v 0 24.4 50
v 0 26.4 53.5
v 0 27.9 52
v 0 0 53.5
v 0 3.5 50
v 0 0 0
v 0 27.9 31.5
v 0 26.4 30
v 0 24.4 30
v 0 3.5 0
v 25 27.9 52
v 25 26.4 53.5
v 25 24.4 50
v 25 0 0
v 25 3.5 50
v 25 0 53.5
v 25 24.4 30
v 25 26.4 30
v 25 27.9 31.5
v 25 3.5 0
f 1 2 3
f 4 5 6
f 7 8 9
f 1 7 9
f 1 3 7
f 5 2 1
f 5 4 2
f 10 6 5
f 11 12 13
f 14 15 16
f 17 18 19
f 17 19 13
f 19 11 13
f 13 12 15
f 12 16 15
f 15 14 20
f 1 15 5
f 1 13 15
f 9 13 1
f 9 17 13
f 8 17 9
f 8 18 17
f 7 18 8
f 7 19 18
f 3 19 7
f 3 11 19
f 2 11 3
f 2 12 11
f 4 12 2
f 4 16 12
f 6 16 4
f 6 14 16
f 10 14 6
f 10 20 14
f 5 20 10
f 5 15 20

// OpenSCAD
// file: Parts/Screw.scad
// created by IndiePandaaaaa | Lukas

TOLERANCE = .1;
$fn = $preview ? 30 : 75;

// metric standards                          M1   M2   M3   M4   M5 M6 M7   M8   M9  M10
function screw_metric_corehole(standard) = [.75, 1.6, 2.5, 3.3, 4.2, 5, 6, 6.8, 7.8, 8.5][standard - 1];
function screw_metric_borehole(standard) = [0, 0, 3.4, 4.5, 5.5, 6.6, 0, 9, 0, 11][standard - 1];
function screw_metric_countersunk_height(standard) = [0, 0, 1.7, 2.3, 2.8, 3.3, 0, 4.4, 0, 5.5][standard - 1];
function screw_metric_countersunk_od(standard) = standard * 2;

module screw_metric_countersunk(standard, length, unthreaded_length = 0, borehole_length = 0, tolerance = .15) {
  if (screw_metric_corehole(standard=standard) == 0) echo("ERROR: screw_metric_corehole value has not been set yet.");
  if (screw_metric_borehole(standard=standard) == 0) echo("ERROR: screw_metric_borehole value has not been set yet.");
  if (screw_metric_countersunk_height(standard=standard) == 0) echo("ERROR: screw_metric_countersunk_height value has not been set yet.");

  union() {
    translate(v=[0, 0, -.1]) {
      cylinder(h=.2 + borehole_length, d=screw_metric_countersunk_od(standard) + tolerance, center=false);
      translate(v=[0, 0, -screw_metric_countersunk_height(standard)]) {
        cylinder(h=screw_metric_countersunk_height(standard) + .01, d2=screw_metric_countersunk_od(standard) + tolerance, d1=screw_metric_borehole(standard) + tolerance, center=false);
        translate(v=[0, 0, -.1]) cylinder(h=.1, d=screw_metric_borehole(standard) + tolerance, center=false);
      }
    }
    translate(v=[0, 0, -length]) cylinder(h=length, d=screw_metric_corehole(standard) + tolerance, center=false);

    // unthreaded part
    translate(v=[0, 0, -.1 - screw_metric_countersunk_height(standard) - unthreaded_length]) cylinder(h=unthreaded_length + .1, d=screw_metric_borehole(standard) + tolerance, center=false);
  }
}

// TODO: module metric cylindric head screws

// TODO: module metric rounded head screws

function screw_wood_corehole(diameter) = diameter * 0.75;
function screw_wood_borehole(diameter) = diameter * 1.25;
function screw_wood_countersunk_height(diameter) = diameter * 0.75;

module screw_wood_countersunk(diameter, length, unthreaded_length = 0, tolerance = .15) {
  if (screw_metric_corehole(standard=standard) == 0) echo("ERROR: screw_metric_corehole value has not been set yet.");
  if (screw_metric_borehole(standard=standard) == 0) echo("ERROR: screw_metric_borehole value has not been set yet.");
  if (screw_metric_countersunk_height(standard=standard) == 0) echo("ERROR: screw_metric_countersunk_height value has not been set yet.");

  // TODO: add module for wood screws 
  union(){}
}

// TODO: module wood cylindric head screws

// TODO: module wood rounded head screws

function cone_diameter(diameter) = diameter * 2;
function cone_diameter_cutout(diameter) = diameter * 2 + 0.5;
function cone_height(diameter) = diameter * 0.75;

module screw(diameter, length = 12, cutout_sample = false) {
  module base_model(diameter, length, cone_height, cone_diameter, offset = 0) {
    rotate_extrude(angle=360) {
      polygon(
        [
          [0, 0],
          [(diameter + offset) / 2, 0],
          [(diameter + offset) / 2, (length + offset) - (cone_height + offset)],
          [(cone_diameter + offset) / 2, length + offset],
          [0, length + offset],
        ]
      );
    }
  }

  if (length < diameter) {
    echo("Screw is too short");
    length = diameter + 5;
    echo("New length is: ", length);
  }

  if (!cutout_sample) {
    translate([0, 0, -length])
      difference() {
        base_model(diameter, length, cone_height(diameter), cone_diameter(diameter));

        // top cross part
        translate([0, 0, length - (cone_height(diameter) - diameter / 2) + .1])
          difference() {
            rotate([0, 0, 45])
              rotate_extrude(angle=360) {
                polygon(
                  [
                    [0, 0],
                    [diameter * 1.4 / 2, 0],
                    [cone_diameter(diameter) / 3, cone_height(diameter) - diameter / 2],
                    [0, cone_height(diameter) - diameter / 2],
                  ]
                );
              }
            for (i = [0:1:3]) {
              rotate([0, 0, 90 * i])
                translate([diameter / 3.18 / 2, diameter / 3.18 / 2, 0]) cube(cone_height(diameter));
            }
          }
      }
  } else {
    offset = 0;
    diameter = cone_diameter_cutout(diameter) / 2; // is duplicated by function, used to reduce error
    translate([0, 0, -length - offset / 2]) {
      base_model(diameter, length, cone_height(diameter), cone_diameter(diameter), offset);
      translate([0, 0, length - .005]) cylinder(r=diameter, h=50);
    }
  }
}

module screw_corehole(diameter_screw, diameter_core, unthreaded_length, length = 12) {
  union() {
    screw(diameter=diameter_screw, length=unthreaded_length, cutout_sample=true);
    if (unthreaded_length < diameter_core - .1) {
      translate(v=[0, 0, -diameter_screw * .8]) cylinder(h=diameter_screw, d=diameter_screw + .3, center=false);
    }
    translate([0, 0, -length]) cylinder(d=diameter_core, h=length - unthreaded_length + .1);
  }
}

module screw_with_nut_metric(screw_length, diameter, square_channel = false, tolerance = .1) {
  function od(width) = ( (width / 2) / cos(30)) * 2; // calculates nut diameter from given width
  nut_thickness = [0.8, 1.6, 2.4, 3.2, 4, 5, 5.5, 6.5];
  nut_width = [2.5, 4, 5.5, 7.1, 8.1, 10.1, 11.1, 13.1];

  if (!(0 < diameter && diameter <= 8 && diameter == round(diameter))) {
    echo("module is only defined for integer values from M1 to M8.");
  } else {
    union() {
      if (!square_channel) {
        screw(diameter=diameter, length=screw_length, cutout_sample=true);

        translate([0, 0, -(screw_length * 2 - nut_thickness[diameter - 1])])
          cylinder(d=od(nut_width[diameter - 1]) + tolerance, h=screw_length, $fn=6);
      } else {
        screw(diameter=diameter, length=screw_length + diameter, cutout_sample=true);
        translate([-od(nut_width[diameter - 1]) / 2 - tolerance, -(nut_width[diameter - 1] / 2), -(screw_length)])
          cube([od(nut_width[diameter - 1]) + screw_length, nut_width[diameter - 1] + tolerance, nut_thickness[diameter - 1] + tolerance]);
      }
    }
  }
}

translate(v=[0, 0, 0]) screw(diameter=3.5, length=12, cutout_sample=false);
translate(v=[20, 0, 0]) screw_corehole(diameter_screw=3, diameter_core=2.5, unthreaded_length=15, length=20);
translate(v=[40, 0, 0]) screw_with_nut(screw_length=30, diameter=4, square_channel=false, tolerance=.1);
translate(v=[60, 0, 0]) SCREW_METRIC_COUNTERSUNK(standard=3, length=12, unthreaded_length=5, borehole_length=5);
// main file
// created by IndiePandaaaaa | Lukas

use <Parts/Screw.scad>

THICKNESS = 3.5;
TOLERANCE = 0.1;
CHAMFER = 1.5;
SCREW_OD = 3.5;
$fn = $preview ? 25 : 125;

BOARD_THICKNESS = 20.8;
MOUNT_HEIGHT = 20;

module top_mount() {
  rotate([90, 0, 90]) difference() {
      linear_extrude(SCREW_OD * 4) {
        polygon(
          [
            [0, CHAMFER],
            [CHAMFER, 0],
            [THICKNESS, 0],
            [THICKNESS, BOARD_THICKNESS],
            [THICKNESS + BOARD_THICKNESS + TOLERANCE, BOARD_THICKNESS],
            [THICKNESS + BOARD_THICKNESS + TOLERANCE, 0],
            [THICKNESS * 2 + BOARD_THICKNESS + TOLERANCE - CHAMFER, 0],
            [THICKNESS * 2 + BOARD_THICKNESS + TOLERANCE, CHAMFER],
            [THICKNESS * 2 + BOARD_THICKNESS + TOLERANCE, BOARD_THICKNESS + THICKNESS],
            [THICKNESS * 2 + BOARD_THICKNESS + TOLERANCE, BOARD_THICKNESS + THICKNESS + MOUNT_HEIGHT],
            [THICKNESS + BOARD_THICKNESS + TOLERANCE, BOARD_THICKNESS + THICKNESS + MOUNT_HEIGHT],
            [THICKNESS + BOARD_THICKNESS + TOLERANCE, BOARD_THICKNESS + THICKNESS],
            [CHAMFER, BOARD_THICKNESS + THICKNESS],
            [0, BOARD_THICKNESS + THICKNESS - CHAMFER],
          ]
        );
      }
      translate(
        [
          THICKNESS * 2 + BOARD_THICKNESS + TOLERANCE,
          BOARD_THICKNESS + MOUNT_HEIGHT + THICKNESS - SCREW_OD * 2,
          SCREW_OD * 2,
        ]
      ) rotate([0, 90, 0]) screw(SCREW_OD, 12, true);
    }
}

module vertical_mount(width = 28.5, height = 58.5) {
  rotate([90, 0, 90]) linear_extrude(width) {
      polygon(
        [
          [0, 0],
          [THICKNESS, 0],
          [THICKNESS, height],
          [THICKNESS + BOARD_THICKNESS + TOLERANCE, height],
          [THICKNESS + BOARD_THICKNESS + TOLERANCE, height - MOUNT_HEIGHT],
          [THICKNESS * 2 + BOARD_THICKNESS + TOLERANCE - CHAMFER, height - MOUNT_HEIGHT],
          [THICKNESS * 2 + BOARD_THICKNESS + TOLERANCE, height - MOUNT_HEIGHT + CHAMFER],
          [THICKNESS * 2 + BOARD_THICKNESS + TOLERANCE, height + THICKNESS - CHAMFER],
          [THICKNESS * 2 + BOARD_THICKNESS + TOLERANCE - CHAMFER, height + THICKNESS],
          [0, height + THICKNESS],
        ]
      );
    }
}

module rodret_mount() {
  // IKEA RODRET smart home switch
  width = 28.5;
  height = 58.5;
  difference() {
    vertical_mount(width=width, height=height);
    for (i = [0:1]) {
      translate(v=[width / 2, -.1, 15 + i * 32.5]) rotate(a=90, v=[-1, 0, 0]) cylinder(h=5, r=2.7 / 2, center=false);
    }
  }
}

module bottle_holder(diameter = 20) {
  size = diameter + THICKNESS * 2 + TOLERANCE;
  union() {
    vertical_mount(width=size, height=diameter * 1.5);
    translate([0, -size / 2 + THICKNESS, 0]) union() {
        cube([size, size / 2, THICKNESS]);
        translate(v=[size / 2, 0, 0]) cylinder(h=THICKNESS, r=size / 2, center=false);
      }
    translate(v=[0, -size / 2 + THICKNESS, diameter]) difference() {
        union() {
          cube([size, size / 2, THICKNESS]);
          translate(v=[size / 2, 0, 0]) cylinder(h=THICKNESS, r=size / 2, center=false);
        }
        translate(v=[size / 2, 0, -diameter / 2])
          cylinder(h=diameter, r=(diameter + TOLERANCE) / 2, center=false);
      }
  }
}

module fan_holder(angle = 30, height = 50) {
  union() {
    vertical_mount(width = 25, height = height);
  }
}

// translate([ 10, 0, 0 ]) top_mount();
// translate([ 40, 0, 0 ]) vertical_mount(width=28.5, height=58.5);
// bottle_holder(25);
// rodret_mount();
fan_holder();
